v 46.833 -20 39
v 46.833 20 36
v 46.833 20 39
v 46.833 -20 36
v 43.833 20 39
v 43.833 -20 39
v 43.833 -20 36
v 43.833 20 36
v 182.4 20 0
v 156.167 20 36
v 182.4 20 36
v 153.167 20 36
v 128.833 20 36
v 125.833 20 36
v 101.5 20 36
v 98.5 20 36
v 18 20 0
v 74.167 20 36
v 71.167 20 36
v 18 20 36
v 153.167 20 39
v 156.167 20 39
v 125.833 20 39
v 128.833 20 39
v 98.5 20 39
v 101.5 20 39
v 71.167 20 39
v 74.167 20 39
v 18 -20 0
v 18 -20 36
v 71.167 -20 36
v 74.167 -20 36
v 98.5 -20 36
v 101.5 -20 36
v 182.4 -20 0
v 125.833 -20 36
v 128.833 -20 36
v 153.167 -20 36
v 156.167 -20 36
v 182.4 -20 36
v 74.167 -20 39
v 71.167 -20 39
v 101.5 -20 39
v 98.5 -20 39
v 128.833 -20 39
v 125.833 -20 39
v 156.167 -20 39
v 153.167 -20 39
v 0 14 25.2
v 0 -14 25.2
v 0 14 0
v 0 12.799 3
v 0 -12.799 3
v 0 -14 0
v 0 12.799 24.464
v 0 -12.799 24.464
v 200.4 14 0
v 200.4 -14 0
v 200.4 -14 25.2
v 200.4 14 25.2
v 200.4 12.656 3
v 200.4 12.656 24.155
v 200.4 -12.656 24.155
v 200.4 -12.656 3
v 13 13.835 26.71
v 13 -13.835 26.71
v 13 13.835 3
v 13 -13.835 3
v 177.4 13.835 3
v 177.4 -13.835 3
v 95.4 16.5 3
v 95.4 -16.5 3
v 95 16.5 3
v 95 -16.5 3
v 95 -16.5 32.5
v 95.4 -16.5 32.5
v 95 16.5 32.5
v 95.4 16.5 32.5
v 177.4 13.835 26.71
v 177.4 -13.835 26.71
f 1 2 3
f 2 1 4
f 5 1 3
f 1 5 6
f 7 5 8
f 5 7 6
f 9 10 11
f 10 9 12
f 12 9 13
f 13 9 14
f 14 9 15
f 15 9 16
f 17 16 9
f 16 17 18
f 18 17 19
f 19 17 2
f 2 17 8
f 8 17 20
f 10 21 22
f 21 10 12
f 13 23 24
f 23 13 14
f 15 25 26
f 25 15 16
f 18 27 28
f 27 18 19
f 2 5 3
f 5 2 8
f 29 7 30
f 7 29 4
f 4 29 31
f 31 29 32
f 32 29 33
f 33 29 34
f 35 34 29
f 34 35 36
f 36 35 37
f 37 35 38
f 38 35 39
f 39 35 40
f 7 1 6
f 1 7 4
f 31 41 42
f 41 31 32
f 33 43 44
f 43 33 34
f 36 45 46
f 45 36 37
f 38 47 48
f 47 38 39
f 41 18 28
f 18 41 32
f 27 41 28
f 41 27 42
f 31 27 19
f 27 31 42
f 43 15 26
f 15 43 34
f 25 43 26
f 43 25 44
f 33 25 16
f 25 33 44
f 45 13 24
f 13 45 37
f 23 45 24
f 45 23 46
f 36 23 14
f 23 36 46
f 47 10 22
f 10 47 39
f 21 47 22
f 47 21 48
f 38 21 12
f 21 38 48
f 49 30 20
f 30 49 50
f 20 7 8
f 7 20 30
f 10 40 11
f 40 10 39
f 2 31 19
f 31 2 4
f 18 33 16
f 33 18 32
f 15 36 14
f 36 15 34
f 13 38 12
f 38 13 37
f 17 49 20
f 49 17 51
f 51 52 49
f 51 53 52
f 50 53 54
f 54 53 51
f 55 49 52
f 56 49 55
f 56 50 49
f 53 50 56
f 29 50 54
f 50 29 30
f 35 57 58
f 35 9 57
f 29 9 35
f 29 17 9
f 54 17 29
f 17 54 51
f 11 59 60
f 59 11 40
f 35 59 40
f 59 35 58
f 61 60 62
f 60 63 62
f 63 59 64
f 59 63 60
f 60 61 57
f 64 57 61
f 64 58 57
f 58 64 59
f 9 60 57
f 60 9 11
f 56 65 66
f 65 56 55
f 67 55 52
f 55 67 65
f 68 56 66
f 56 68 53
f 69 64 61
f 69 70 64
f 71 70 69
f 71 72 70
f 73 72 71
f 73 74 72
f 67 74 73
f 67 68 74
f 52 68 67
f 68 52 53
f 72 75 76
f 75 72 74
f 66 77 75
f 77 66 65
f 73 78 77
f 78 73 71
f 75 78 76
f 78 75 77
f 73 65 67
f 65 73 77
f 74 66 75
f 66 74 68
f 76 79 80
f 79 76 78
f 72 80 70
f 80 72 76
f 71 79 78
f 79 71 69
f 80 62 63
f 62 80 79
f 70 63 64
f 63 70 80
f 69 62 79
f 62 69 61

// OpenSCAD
$fn = 32;

// ----------------------------------------------------------------------
// Faired channel: 200 x 40 x 36 mm, 3.5 mm walls, faired ends
// ----------------------------------------------------------------------

// --- parameters (mm) ---
length = 200;             // channel length
width = 40;               // channel width at mid length
height = 36;              // channel height at mid length
wall = 3.5;               // side wall thickness
floor_t = 3;              // floor thickness
end_w = 28;               // faired end width
end_h = 25.2;             // faired end height
ribs = 5;                 // stiffening ribs on the top
rib_t = 3;                // rib thickness
rib_h = 3;                // rib height

difference() {
  union() {
    hull() {
      translate([0, -14, 0]) cube([0.4, 28, 25.2]);
      translate([18, -20, 0]) cube([0.4, 40, 36]);
    }
    hull() {
      translate([18, -20, 0]) cube([0.4, 40, 36]);
      translate([100, -20, 0]) cube([0.4, 40, 36]);
    }
    hull() {
      translate([100, -20, 0]) cube([0.4, 40, 36]);
      translate([182, -20, 0]) cube([0.4, 40, 36]);
    }
    hull() {
      translate([182, -20, 0]) cube([0.4, 40, 36]);
      translate([200, -14, 0]) cube([0.4, 28, 25.2]);
    }
    /* stiffening ribs across the flat top, sunk 0.8 mm into it */
    for (i = [1 : ribs]) {
      translate([18 + i * (length - 2 * 18) / (ribs + 1) - rib_t / 2, -width / 2, height - 0.8]) cube([rib_t, width, rib_h + 0.8]);
    }
  }
  /* cavity, 5 mm proud of both ends so the ports are cut clean */
  hull() {
    translate([-5, -12.4, 3]) cube([0.4, 24.8, 20.6]);
    translate([13, -13.835, 3]) cube([0.4, 27.67, 23.71]);
  }
  hull() {
    translate([13, -13.835, 3]) cube([0.4, 27.67, 23.71]);
    translate([95, -16.5, 3]) cube([0.4, 33, 29.5]);
  }
  hull() {
    translate([95, -16.5, 3]) cube([0.4, 33, 29.5]);
    translate([177, -13.835, 3]) cube([0.4, 27.67, 23.71]);
  }
  hull() {
    translate([177, -13.835, 3]) cube([0.4, 27.67, 23.71]);
    translate([205, -12.4, 3]) cube([0.4, 24.8, 20.6]);
  }
}
